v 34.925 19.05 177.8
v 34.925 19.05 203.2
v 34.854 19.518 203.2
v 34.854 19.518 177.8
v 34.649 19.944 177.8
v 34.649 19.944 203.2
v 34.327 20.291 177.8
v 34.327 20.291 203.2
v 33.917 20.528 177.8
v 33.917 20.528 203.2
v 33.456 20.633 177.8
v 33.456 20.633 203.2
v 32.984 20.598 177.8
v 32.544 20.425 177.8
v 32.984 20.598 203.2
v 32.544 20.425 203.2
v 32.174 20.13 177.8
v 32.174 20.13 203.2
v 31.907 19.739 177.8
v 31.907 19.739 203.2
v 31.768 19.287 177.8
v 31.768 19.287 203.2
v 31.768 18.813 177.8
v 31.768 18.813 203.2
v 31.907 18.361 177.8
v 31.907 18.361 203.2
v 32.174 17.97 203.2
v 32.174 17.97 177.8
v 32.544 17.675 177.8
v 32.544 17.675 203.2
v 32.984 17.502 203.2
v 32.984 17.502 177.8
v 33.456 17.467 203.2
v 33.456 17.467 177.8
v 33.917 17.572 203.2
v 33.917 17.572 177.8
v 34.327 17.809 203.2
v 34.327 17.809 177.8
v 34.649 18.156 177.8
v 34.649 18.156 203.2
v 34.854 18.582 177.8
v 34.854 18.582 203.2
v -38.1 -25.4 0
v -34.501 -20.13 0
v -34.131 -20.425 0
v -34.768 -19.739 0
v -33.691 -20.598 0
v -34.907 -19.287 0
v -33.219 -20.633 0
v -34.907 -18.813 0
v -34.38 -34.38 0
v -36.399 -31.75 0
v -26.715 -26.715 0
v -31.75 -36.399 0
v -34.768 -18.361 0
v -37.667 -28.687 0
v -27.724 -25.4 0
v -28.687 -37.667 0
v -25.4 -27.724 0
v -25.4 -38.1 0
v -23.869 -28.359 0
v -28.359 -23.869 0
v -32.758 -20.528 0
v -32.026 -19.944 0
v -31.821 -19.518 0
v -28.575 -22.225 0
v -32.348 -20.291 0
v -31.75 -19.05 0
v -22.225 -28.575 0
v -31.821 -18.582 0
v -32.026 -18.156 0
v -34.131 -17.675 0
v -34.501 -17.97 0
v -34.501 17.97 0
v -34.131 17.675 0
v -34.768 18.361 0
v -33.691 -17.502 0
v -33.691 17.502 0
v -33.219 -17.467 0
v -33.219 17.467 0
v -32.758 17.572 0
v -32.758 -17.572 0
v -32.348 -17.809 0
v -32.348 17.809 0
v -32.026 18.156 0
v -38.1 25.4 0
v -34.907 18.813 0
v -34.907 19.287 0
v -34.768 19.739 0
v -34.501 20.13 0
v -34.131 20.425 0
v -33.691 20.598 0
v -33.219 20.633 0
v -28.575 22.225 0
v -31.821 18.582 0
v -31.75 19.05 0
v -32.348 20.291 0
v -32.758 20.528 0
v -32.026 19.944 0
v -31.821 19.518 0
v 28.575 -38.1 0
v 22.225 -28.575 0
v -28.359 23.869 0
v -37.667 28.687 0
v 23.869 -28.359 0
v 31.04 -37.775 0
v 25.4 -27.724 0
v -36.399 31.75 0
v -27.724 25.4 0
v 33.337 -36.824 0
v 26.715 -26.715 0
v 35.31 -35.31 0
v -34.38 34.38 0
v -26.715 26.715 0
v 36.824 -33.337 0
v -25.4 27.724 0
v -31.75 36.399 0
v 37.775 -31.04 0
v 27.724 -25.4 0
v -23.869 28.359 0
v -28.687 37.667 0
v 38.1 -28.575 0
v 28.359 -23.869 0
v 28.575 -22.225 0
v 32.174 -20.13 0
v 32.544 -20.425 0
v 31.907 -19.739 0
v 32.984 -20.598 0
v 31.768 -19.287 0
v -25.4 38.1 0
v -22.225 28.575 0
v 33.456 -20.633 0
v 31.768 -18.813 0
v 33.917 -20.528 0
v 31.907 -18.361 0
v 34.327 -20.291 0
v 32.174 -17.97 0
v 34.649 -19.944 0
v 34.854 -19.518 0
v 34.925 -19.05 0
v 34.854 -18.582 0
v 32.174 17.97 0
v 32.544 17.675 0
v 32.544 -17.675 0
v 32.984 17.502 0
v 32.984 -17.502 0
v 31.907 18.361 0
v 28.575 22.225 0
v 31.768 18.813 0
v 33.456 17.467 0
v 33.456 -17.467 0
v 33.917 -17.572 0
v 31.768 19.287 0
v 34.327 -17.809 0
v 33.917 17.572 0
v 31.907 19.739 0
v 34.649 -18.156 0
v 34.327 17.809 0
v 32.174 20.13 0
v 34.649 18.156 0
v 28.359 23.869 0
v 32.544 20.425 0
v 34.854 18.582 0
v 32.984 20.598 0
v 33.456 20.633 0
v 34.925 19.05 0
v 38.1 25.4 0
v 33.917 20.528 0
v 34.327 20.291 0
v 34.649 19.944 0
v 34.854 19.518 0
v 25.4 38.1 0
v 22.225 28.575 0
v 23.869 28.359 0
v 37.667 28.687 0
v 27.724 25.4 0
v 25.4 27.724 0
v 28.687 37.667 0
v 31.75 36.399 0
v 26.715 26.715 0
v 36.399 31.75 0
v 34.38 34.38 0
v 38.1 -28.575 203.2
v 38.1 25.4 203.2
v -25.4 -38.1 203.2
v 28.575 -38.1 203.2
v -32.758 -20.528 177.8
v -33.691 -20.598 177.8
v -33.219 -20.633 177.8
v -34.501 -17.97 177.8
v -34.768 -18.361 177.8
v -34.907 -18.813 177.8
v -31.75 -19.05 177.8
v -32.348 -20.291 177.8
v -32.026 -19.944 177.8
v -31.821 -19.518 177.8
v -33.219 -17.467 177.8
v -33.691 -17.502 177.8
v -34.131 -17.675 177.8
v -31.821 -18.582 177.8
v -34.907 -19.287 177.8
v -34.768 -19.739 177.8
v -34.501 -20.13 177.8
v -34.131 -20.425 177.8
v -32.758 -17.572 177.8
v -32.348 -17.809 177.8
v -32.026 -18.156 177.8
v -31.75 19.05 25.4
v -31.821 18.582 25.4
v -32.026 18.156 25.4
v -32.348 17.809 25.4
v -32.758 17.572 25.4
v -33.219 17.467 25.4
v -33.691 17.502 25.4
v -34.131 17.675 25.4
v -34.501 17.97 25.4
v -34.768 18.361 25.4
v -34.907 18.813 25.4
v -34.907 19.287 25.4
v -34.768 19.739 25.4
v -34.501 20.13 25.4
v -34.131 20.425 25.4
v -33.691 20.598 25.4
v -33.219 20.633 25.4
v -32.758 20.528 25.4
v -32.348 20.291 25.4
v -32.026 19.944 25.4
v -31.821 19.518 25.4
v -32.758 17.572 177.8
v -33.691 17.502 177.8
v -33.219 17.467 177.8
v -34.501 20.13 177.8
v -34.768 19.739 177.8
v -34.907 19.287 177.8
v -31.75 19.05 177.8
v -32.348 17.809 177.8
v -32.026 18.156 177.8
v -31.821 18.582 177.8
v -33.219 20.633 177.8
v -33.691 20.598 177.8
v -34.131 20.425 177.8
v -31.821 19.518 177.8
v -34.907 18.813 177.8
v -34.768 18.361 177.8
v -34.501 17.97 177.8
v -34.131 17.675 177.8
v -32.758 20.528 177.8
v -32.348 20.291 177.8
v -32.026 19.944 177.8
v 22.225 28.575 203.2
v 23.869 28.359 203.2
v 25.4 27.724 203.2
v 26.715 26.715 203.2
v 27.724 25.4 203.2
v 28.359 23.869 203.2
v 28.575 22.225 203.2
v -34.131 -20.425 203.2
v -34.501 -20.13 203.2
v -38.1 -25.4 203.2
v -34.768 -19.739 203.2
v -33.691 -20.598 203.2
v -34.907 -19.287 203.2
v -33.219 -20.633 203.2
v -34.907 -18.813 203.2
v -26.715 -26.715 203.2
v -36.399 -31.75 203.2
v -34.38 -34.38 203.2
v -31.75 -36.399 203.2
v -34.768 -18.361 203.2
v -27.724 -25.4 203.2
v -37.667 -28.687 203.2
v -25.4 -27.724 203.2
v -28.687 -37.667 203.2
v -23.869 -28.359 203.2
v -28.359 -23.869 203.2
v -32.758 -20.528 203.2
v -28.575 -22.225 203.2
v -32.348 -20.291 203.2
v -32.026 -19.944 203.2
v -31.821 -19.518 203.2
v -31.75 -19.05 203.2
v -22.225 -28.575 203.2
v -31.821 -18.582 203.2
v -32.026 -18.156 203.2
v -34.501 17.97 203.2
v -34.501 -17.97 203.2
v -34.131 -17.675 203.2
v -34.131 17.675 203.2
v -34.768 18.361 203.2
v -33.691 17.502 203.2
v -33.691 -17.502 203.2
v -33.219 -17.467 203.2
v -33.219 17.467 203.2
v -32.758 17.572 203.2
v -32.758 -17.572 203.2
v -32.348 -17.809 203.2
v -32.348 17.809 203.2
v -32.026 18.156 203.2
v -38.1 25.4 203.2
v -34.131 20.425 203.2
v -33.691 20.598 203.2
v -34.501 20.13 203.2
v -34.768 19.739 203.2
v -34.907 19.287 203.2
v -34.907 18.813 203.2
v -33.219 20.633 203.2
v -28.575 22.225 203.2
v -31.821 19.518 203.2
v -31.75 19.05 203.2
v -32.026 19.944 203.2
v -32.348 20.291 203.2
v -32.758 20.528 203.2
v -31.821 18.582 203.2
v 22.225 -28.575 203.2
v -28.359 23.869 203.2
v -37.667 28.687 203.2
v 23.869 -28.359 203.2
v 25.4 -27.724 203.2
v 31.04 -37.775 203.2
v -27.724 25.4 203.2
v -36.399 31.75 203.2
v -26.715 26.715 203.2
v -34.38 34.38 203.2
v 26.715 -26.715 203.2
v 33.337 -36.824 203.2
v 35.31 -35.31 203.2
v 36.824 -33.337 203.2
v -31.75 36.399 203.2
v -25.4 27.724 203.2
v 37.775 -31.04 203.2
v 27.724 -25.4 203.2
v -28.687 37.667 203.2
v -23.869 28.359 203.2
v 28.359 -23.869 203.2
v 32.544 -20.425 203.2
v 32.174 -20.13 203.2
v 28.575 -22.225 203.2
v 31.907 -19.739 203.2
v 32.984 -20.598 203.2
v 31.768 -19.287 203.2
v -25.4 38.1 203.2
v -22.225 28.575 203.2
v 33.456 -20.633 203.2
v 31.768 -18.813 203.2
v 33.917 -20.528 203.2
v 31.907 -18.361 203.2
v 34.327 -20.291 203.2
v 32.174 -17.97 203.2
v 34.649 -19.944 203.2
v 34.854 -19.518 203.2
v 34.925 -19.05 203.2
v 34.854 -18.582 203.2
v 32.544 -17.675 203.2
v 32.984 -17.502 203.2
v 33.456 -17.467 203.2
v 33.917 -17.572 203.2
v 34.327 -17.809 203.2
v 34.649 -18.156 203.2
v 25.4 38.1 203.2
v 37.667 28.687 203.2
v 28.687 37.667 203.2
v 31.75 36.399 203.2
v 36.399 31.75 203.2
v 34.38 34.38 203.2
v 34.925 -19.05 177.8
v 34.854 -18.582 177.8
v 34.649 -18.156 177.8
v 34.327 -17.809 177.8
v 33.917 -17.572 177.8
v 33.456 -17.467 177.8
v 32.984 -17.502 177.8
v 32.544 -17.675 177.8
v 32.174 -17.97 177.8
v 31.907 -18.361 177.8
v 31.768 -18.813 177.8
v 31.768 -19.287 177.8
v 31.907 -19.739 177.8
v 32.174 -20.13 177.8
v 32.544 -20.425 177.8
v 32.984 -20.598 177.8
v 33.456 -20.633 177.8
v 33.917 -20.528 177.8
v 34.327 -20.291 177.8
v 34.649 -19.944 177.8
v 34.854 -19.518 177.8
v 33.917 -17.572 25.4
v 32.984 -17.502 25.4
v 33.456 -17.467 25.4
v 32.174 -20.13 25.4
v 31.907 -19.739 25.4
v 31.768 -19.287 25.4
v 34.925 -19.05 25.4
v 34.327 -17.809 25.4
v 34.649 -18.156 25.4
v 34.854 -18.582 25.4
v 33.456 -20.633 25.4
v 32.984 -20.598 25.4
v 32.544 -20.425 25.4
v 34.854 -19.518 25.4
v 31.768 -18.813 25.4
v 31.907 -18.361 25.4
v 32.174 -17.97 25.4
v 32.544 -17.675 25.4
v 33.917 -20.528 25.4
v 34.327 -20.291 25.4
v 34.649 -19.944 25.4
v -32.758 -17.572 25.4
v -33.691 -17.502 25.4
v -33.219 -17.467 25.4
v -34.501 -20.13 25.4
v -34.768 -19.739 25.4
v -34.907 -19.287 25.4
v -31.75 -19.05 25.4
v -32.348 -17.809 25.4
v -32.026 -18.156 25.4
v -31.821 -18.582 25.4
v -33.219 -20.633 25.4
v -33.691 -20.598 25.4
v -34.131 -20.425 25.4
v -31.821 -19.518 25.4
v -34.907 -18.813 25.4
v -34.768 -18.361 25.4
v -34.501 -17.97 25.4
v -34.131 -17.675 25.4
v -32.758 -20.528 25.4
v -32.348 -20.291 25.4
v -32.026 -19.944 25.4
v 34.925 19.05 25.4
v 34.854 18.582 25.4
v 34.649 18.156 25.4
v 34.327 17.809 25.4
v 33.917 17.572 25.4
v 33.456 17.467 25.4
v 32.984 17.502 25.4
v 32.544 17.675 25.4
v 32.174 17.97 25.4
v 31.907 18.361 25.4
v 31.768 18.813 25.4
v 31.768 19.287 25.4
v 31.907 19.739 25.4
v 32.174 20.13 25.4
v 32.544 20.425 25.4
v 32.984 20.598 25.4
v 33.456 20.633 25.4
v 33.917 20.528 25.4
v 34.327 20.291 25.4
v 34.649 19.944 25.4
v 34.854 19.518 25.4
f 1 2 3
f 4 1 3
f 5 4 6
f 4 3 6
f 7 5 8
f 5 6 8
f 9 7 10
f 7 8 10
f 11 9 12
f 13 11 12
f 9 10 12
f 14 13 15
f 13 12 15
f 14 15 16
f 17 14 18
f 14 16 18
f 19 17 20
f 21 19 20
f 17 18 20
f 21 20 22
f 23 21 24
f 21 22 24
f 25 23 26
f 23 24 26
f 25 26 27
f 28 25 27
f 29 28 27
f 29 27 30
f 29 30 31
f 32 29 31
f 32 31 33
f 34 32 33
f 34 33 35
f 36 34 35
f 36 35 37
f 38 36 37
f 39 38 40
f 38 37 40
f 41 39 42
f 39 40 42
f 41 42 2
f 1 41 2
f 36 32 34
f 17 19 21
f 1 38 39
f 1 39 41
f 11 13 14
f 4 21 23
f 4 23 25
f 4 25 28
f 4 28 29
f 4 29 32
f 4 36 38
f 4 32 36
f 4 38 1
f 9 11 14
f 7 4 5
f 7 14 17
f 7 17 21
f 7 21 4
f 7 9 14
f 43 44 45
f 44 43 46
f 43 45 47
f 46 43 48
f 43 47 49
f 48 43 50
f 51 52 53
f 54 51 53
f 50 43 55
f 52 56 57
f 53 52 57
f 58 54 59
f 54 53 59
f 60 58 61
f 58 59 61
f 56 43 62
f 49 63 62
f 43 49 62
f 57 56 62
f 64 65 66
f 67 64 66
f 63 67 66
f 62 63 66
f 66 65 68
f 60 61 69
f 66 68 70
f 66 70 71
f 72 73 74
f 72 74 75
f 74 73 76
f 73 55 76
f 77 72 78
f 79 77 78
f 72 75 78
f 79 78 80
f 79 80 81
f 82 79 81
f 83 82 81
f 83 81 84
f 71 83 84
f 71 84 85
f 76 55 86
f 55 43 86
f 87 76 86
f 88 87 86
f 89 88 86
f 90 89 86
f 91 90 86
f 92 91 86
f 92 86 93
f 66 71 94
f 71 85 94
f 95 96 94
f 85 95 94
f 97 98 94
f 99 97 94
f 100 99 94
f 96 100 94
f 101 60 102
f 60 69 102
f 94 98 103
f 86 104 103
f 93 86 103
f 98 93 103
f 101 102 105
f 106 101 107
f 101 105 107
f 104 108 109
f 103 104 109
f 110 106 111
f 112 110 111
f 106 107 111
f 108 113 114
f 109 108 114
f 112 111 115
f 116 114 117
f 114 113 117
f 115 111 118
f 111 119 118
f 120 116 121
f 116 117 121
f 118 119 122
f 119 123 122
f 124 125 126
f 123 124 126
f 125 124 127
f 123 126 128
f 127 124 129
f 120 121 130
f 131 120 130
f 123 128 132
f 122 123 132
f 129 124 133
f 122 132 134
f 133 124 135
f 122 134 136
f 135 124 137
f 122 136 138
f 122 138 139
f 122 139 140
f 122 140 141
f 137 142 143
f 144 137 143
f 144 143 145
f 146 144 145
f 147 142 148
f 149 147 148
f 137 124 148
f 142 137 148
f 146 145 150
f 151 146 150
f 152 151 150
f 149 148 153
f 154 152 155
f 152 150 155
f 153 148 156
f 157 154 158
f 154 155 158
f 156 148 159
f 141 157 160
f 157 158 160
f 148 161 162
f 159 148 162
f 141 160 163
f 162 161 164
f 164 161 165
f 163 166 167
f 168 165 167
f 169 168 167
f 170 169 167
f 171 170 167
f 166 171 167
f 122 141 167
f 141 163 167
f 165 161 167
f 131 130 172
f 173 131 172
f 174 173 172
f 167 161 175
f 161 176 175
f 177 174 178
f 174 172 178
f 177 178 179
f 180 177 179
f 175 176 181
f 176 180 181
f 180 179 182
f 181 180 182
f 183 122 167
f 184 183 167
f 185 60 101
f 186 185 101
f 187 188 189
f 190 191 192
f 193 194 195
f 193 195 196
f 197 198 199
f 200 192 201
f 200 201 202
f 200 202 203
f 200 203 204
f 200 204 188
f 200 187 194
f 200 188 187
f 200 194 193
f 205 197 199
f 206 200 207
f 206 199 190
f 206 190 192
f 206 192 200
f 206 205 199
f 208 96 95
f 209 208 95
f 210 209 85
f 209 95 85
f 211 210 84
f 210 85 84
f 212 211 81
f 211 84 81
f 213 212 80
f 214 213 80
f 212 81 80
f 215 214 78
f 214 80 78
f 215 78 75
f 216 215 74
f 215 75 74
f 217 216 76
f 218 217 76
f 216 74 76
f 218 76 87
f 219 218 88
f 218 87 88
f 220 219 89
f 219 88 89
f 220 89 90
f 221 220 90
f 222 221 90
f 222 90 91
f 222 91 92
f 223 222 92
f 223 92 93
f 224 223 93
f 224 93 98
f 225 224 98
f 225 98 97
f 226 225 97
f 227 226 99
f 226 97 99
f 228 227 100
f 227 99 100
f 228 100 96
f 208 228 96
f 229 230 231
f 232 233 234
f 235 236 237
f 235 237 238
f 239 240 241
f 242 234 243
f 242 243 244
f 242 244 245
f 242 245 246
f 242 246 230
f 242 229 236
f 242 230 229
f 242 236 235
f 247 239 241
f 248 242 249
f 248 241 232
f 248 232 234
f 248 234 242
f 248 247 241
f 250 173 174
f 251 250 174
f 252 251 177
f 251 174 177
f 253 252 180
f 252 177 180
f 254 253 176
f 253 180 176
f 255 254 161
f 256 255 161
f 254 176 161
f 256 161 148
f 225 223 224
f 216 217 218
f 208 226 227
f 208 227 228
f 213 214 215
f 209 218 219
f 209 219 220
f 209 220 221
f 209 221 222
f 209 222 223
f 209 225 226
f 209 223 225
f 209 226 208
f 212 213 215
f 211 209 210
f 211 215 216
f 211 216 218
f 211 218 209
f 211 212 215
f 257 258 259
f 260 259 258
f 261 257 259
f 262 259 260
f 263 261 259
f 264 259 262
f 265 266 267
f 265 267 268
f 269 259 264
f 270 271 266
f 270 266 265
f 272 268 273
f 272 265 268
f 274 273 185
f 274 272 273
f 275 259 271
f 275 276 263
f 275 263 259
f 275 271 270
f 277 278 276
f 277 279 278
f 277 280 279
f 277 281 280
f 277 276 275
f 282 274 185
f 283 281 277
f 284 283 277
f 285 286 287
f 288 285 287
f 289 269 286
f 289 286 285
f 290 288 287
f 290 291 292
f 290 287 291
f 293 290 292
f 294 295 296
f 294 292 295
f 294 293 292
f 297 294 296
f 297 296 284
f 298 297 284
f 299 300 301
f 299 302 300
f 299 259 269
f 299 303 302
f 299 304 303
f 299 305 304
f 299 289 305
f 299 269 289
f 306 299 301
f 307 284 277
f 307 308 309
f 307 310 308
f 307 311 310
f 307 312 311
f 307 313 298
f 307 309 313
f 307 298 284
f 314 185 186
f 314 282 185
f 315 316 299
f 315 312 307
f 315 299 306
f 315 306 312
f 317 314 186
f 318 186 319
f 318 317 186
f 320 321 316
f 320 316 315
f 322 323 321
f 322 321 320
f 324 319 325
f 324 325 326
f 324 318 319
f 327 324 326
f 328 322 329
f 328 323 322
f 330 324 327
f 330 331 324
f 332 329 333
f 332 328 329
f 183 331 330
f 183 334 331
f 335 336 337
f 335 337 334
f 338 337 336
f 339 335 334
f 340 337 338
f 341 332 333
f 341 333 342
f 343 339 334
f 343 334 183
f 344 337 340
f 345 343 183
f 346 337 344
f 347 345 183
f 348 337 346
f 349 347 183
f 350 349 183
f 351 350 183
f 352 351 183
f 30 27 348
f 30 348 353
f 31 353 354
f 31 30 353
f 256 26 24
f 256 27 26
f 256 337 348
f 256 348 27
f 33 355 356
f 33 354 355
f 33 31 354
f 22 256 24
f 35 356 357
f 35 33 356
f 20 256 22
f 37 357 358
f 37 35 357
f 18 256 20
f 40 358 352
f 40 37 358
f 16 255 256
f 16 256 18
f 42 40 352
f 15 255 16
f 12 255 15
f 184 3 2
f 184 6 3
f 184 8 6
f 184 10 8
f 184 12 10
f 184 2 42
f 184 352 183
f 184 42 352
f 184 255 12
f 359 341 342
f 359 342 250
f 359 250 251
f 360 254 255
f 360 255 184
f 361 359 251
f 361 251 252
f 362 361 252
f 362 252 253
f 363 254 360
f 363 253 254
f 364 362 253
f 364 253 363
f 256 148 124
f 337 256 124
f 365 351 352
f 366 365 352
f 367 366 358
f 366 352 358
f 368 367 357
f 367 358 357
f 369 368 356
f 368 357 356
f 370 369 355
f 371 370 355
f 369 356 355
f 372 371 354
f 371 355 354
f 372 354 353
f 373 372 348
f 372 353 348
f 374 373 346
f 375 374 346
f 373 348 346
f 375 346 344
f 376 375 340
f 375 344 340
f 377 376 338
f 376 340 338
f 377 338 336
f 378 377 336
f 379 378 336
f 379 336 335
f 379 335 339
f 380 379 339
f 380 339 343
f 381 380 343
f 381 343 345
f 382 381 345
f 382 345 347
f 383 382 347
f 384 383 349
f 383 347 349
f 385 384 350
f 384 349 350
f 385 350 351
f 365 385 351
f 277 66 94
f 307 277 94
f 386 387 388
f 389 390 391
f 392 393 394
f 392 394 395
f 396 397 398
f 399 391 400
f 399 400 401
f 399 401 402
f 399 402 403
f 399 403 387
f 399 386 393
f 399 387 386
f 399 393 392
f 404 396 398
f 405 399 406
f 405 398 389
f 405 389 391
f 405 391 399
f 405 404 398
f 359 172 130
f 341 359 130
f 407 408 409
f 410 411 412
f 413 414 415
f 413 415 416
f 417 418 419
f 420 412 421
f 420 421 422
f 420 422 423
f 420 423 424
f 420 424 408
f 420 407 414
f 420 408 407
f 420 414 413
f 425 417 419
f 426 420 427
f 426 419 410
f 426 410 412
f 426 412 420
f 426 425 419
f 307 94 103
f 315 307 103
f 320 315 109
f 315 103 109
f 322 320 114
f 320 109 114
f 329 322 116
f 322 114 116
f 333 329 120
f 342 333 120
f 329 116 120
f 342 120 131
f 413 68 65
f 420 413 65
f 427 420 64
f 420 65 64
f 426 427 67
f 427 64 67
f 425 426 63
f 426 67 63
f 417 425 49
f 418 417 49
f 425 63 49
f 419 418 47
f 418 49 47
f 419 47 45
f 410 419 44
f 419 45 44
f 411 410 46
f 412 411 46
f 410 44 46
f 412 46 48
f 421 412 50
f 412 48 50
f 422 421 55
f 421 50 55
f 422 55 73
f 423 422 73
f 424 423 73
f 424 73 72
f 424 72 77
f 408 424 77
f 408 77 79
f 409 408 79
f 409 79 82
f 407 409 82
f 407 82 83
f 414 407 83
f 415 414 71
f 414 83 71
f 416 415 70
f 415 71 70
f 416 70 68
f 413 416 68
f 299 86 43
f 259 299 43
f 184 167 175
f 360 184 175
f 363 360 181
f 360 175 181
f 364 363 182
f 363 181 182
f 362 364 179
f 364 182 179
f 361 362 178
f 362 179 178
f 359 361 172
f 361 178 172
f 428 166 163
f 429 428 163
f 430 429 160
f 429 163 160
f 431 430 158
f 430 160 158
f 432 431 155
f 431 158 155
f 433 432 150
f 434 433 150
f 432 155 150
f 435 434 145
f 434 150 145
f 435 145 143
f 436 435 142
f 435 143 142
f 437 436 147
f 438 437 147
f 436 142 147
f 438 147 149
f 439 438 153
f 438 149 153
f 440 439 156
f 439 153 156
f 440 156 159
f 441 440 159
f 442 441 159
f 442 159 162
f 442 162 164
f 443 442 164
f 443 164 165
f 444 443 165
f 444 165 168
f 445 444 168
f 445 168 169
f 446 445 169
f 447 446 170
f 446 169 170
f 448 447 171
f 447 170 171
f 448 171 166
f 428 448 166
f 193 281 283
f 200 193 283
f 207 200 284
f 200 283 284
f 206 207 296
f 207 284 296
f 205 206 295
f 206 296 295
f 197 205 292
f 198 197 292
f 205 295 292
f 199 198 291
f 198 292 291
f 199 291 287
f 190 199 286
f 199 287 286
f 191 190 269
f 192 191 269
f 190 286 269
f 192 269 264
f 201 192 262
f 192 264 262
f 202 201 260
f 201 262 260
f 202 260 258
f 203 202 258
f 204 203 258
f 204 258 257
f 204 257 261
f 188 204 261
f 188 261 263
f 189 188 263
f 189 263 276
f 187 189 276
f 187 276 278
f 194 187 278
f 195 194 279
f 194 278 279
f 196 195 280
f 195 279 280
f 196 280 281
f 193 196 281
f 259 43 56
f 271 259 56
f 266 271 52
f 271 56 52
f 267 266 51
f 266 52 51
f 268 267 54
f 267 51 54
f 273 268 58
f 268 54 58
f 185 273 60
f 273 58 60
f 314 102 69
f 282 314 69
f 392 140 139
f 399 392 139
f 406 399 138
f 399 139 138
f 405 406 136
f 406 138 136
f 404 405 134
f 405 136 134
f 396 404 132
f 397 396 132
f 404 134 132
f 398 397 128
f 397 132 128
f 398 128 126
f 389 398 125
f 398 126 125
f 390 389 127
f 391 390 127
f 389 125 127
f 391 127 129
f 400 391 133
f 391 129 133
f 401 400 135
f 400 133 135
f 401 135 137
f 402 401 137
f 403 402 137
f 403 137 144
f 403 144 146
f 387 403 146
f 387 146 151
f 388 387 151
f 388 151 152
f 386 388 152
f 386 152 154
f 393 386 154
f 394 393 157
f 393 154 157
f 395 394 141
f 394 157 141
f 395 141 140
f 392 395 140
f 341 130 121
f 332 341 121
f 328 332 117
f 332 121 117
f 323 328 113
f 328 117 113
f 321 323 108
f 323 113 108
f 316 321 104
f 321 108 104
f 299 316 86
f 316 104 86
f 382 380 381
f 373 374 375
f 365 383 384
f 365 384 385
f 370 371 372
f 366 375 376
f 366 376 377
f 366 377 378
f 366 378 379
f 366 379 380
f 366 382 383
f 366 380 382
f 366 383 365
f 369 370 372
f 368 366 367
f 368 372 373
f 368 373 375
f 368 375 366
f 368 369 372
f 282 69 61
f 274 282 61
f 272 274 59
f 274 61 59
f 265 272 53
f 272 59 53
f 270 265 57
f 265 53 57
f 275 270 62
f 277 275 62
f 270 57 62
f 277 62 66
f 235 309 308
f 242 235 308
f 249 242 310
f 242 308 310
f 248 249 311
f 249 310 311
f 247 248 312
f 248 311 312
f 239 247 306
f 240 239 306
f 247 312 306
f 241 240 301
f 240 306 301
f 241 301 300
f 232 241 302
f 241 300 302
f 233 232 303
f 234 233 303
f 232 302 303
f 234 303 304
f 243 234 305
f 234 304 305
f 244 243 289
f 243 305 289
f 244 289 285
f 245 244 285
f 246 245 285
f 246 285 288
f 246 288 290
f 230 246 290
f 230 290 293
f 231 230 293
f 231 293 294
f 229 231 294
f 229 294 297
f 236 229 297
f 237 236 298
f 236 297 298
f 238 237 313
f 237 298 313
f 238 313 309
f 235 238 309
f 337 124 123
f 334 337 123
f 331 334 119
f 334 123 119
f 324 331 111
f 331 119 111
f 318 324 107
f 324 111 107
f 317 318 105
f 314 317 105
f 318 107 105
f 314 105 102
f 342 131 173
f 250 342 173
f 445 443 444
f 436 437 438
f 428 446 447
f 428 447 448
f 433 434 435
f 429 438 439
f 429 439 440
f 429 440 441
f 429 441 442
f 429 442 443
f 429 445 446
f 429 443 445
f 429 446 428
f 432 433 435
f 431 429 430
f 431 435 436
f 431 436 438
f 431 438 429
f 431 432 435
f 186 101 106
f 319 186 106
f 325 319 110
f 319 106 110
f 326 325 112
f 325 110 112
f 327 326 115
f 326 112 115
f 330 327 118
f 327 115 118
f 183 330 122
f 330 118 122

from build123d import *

# Parameters (mm, degrees)
F1_DEPTH = 203.2
F2_R     = 1.5875
F3_DEPTH = 25.4
F4_R     = 1.5875
F5_DEPTH = 25.4


with BuildPart() as f1:
    # F0 (on Top) → F1 (new body)
    with BuildSketch(Plane.XY):
        with BuildLine():
            Line((-25.4, -38.1), (28.575, -38.1))
            ThreePointArc((28.575, -38.1), (35.310192, -35.310192), (38.1, -28.575))
            Line((38.1, -28.575), (38.1, 25.4))
            ThreePointArc((38.1, 25.4), (34.380256, 34.380256), (25.4, 38.1))
            Line((25.4, 38.1), (-25.4, 38.1))
            ThreePointArc((-25.4, 38.1), (-34.380256, 34.380256), (-38.1, 25.4))
            Line((-38.1, 25.4), (-38.1, -25.4))
            ThreePointArc((-38.1, -25.4), (-34.380256, -34.380256), (-25.4, -38.1))
        make_face()
        with BuildLine():
            ThreePointArc((28.575, -22.225), (26.715128, -26.715128), (22.225, -28.575))
            Line((22.225, -28.575), (-22.225, -28.575))
            ThreePointArc((-22.225, -28.575), (-26.715128, -26.715128), (-28.575, -22.225))
            Line((-28.575, -22.225), (-28.575, 22.225))
            ThreePointArc((-28.575, 22.225), (-26.715128, 26.715128), (-22.225, 28.575))
            Line((-22.225, 28.575), (22.225, 28.575))
            ThreePointArc((22.225, 28.575), (26.715128, 26.715128), (28.575, 22.225))
            Line((28.575, 22.225), (28.575, -22.225))
        make_face(mode=Mode.SUBTRACT)
    extrude(amount=F1_DEPTH)

    # F2 (on face) → F3 (cut)
    with BuildSketch(Plane.XY.offset(203.2)):
        with Locations((-33.3375, 19.05)):
            Circle(F2_R)
        with Locations((-33.3375, -19.05)):
            Circle(F2_R)
        with Locations((33.3375, -19.05)):
            Circle(F2_R)
        with Locations((33.3375, 19.05)):
            Circle(F2_R)
    extrude(amount=-F3_DEPTH, mode=Mode.SUBTRACT)

    # F4 (on face) → F5 (cut)
    with BuildSketch(Plane(origin=(0, 0, 0), x_dir=(1, 0, 0), z_dir=(0, 0, -1))):
        with Locations((-33.3375, 19.05)):
            Circle(F4_R)
        with Locations((-33.3375, -19.05)):
            Circle(F4_R)
        with Locations((33.3375, 19.05)):
            Circle(F4_R)
        with Locations((33.3375, -19.05)):
            Circle(F4_R)
    extrude(amount=-F5_DEPTH, mode=Mode.SUBTRACT)


solid = f1.part
